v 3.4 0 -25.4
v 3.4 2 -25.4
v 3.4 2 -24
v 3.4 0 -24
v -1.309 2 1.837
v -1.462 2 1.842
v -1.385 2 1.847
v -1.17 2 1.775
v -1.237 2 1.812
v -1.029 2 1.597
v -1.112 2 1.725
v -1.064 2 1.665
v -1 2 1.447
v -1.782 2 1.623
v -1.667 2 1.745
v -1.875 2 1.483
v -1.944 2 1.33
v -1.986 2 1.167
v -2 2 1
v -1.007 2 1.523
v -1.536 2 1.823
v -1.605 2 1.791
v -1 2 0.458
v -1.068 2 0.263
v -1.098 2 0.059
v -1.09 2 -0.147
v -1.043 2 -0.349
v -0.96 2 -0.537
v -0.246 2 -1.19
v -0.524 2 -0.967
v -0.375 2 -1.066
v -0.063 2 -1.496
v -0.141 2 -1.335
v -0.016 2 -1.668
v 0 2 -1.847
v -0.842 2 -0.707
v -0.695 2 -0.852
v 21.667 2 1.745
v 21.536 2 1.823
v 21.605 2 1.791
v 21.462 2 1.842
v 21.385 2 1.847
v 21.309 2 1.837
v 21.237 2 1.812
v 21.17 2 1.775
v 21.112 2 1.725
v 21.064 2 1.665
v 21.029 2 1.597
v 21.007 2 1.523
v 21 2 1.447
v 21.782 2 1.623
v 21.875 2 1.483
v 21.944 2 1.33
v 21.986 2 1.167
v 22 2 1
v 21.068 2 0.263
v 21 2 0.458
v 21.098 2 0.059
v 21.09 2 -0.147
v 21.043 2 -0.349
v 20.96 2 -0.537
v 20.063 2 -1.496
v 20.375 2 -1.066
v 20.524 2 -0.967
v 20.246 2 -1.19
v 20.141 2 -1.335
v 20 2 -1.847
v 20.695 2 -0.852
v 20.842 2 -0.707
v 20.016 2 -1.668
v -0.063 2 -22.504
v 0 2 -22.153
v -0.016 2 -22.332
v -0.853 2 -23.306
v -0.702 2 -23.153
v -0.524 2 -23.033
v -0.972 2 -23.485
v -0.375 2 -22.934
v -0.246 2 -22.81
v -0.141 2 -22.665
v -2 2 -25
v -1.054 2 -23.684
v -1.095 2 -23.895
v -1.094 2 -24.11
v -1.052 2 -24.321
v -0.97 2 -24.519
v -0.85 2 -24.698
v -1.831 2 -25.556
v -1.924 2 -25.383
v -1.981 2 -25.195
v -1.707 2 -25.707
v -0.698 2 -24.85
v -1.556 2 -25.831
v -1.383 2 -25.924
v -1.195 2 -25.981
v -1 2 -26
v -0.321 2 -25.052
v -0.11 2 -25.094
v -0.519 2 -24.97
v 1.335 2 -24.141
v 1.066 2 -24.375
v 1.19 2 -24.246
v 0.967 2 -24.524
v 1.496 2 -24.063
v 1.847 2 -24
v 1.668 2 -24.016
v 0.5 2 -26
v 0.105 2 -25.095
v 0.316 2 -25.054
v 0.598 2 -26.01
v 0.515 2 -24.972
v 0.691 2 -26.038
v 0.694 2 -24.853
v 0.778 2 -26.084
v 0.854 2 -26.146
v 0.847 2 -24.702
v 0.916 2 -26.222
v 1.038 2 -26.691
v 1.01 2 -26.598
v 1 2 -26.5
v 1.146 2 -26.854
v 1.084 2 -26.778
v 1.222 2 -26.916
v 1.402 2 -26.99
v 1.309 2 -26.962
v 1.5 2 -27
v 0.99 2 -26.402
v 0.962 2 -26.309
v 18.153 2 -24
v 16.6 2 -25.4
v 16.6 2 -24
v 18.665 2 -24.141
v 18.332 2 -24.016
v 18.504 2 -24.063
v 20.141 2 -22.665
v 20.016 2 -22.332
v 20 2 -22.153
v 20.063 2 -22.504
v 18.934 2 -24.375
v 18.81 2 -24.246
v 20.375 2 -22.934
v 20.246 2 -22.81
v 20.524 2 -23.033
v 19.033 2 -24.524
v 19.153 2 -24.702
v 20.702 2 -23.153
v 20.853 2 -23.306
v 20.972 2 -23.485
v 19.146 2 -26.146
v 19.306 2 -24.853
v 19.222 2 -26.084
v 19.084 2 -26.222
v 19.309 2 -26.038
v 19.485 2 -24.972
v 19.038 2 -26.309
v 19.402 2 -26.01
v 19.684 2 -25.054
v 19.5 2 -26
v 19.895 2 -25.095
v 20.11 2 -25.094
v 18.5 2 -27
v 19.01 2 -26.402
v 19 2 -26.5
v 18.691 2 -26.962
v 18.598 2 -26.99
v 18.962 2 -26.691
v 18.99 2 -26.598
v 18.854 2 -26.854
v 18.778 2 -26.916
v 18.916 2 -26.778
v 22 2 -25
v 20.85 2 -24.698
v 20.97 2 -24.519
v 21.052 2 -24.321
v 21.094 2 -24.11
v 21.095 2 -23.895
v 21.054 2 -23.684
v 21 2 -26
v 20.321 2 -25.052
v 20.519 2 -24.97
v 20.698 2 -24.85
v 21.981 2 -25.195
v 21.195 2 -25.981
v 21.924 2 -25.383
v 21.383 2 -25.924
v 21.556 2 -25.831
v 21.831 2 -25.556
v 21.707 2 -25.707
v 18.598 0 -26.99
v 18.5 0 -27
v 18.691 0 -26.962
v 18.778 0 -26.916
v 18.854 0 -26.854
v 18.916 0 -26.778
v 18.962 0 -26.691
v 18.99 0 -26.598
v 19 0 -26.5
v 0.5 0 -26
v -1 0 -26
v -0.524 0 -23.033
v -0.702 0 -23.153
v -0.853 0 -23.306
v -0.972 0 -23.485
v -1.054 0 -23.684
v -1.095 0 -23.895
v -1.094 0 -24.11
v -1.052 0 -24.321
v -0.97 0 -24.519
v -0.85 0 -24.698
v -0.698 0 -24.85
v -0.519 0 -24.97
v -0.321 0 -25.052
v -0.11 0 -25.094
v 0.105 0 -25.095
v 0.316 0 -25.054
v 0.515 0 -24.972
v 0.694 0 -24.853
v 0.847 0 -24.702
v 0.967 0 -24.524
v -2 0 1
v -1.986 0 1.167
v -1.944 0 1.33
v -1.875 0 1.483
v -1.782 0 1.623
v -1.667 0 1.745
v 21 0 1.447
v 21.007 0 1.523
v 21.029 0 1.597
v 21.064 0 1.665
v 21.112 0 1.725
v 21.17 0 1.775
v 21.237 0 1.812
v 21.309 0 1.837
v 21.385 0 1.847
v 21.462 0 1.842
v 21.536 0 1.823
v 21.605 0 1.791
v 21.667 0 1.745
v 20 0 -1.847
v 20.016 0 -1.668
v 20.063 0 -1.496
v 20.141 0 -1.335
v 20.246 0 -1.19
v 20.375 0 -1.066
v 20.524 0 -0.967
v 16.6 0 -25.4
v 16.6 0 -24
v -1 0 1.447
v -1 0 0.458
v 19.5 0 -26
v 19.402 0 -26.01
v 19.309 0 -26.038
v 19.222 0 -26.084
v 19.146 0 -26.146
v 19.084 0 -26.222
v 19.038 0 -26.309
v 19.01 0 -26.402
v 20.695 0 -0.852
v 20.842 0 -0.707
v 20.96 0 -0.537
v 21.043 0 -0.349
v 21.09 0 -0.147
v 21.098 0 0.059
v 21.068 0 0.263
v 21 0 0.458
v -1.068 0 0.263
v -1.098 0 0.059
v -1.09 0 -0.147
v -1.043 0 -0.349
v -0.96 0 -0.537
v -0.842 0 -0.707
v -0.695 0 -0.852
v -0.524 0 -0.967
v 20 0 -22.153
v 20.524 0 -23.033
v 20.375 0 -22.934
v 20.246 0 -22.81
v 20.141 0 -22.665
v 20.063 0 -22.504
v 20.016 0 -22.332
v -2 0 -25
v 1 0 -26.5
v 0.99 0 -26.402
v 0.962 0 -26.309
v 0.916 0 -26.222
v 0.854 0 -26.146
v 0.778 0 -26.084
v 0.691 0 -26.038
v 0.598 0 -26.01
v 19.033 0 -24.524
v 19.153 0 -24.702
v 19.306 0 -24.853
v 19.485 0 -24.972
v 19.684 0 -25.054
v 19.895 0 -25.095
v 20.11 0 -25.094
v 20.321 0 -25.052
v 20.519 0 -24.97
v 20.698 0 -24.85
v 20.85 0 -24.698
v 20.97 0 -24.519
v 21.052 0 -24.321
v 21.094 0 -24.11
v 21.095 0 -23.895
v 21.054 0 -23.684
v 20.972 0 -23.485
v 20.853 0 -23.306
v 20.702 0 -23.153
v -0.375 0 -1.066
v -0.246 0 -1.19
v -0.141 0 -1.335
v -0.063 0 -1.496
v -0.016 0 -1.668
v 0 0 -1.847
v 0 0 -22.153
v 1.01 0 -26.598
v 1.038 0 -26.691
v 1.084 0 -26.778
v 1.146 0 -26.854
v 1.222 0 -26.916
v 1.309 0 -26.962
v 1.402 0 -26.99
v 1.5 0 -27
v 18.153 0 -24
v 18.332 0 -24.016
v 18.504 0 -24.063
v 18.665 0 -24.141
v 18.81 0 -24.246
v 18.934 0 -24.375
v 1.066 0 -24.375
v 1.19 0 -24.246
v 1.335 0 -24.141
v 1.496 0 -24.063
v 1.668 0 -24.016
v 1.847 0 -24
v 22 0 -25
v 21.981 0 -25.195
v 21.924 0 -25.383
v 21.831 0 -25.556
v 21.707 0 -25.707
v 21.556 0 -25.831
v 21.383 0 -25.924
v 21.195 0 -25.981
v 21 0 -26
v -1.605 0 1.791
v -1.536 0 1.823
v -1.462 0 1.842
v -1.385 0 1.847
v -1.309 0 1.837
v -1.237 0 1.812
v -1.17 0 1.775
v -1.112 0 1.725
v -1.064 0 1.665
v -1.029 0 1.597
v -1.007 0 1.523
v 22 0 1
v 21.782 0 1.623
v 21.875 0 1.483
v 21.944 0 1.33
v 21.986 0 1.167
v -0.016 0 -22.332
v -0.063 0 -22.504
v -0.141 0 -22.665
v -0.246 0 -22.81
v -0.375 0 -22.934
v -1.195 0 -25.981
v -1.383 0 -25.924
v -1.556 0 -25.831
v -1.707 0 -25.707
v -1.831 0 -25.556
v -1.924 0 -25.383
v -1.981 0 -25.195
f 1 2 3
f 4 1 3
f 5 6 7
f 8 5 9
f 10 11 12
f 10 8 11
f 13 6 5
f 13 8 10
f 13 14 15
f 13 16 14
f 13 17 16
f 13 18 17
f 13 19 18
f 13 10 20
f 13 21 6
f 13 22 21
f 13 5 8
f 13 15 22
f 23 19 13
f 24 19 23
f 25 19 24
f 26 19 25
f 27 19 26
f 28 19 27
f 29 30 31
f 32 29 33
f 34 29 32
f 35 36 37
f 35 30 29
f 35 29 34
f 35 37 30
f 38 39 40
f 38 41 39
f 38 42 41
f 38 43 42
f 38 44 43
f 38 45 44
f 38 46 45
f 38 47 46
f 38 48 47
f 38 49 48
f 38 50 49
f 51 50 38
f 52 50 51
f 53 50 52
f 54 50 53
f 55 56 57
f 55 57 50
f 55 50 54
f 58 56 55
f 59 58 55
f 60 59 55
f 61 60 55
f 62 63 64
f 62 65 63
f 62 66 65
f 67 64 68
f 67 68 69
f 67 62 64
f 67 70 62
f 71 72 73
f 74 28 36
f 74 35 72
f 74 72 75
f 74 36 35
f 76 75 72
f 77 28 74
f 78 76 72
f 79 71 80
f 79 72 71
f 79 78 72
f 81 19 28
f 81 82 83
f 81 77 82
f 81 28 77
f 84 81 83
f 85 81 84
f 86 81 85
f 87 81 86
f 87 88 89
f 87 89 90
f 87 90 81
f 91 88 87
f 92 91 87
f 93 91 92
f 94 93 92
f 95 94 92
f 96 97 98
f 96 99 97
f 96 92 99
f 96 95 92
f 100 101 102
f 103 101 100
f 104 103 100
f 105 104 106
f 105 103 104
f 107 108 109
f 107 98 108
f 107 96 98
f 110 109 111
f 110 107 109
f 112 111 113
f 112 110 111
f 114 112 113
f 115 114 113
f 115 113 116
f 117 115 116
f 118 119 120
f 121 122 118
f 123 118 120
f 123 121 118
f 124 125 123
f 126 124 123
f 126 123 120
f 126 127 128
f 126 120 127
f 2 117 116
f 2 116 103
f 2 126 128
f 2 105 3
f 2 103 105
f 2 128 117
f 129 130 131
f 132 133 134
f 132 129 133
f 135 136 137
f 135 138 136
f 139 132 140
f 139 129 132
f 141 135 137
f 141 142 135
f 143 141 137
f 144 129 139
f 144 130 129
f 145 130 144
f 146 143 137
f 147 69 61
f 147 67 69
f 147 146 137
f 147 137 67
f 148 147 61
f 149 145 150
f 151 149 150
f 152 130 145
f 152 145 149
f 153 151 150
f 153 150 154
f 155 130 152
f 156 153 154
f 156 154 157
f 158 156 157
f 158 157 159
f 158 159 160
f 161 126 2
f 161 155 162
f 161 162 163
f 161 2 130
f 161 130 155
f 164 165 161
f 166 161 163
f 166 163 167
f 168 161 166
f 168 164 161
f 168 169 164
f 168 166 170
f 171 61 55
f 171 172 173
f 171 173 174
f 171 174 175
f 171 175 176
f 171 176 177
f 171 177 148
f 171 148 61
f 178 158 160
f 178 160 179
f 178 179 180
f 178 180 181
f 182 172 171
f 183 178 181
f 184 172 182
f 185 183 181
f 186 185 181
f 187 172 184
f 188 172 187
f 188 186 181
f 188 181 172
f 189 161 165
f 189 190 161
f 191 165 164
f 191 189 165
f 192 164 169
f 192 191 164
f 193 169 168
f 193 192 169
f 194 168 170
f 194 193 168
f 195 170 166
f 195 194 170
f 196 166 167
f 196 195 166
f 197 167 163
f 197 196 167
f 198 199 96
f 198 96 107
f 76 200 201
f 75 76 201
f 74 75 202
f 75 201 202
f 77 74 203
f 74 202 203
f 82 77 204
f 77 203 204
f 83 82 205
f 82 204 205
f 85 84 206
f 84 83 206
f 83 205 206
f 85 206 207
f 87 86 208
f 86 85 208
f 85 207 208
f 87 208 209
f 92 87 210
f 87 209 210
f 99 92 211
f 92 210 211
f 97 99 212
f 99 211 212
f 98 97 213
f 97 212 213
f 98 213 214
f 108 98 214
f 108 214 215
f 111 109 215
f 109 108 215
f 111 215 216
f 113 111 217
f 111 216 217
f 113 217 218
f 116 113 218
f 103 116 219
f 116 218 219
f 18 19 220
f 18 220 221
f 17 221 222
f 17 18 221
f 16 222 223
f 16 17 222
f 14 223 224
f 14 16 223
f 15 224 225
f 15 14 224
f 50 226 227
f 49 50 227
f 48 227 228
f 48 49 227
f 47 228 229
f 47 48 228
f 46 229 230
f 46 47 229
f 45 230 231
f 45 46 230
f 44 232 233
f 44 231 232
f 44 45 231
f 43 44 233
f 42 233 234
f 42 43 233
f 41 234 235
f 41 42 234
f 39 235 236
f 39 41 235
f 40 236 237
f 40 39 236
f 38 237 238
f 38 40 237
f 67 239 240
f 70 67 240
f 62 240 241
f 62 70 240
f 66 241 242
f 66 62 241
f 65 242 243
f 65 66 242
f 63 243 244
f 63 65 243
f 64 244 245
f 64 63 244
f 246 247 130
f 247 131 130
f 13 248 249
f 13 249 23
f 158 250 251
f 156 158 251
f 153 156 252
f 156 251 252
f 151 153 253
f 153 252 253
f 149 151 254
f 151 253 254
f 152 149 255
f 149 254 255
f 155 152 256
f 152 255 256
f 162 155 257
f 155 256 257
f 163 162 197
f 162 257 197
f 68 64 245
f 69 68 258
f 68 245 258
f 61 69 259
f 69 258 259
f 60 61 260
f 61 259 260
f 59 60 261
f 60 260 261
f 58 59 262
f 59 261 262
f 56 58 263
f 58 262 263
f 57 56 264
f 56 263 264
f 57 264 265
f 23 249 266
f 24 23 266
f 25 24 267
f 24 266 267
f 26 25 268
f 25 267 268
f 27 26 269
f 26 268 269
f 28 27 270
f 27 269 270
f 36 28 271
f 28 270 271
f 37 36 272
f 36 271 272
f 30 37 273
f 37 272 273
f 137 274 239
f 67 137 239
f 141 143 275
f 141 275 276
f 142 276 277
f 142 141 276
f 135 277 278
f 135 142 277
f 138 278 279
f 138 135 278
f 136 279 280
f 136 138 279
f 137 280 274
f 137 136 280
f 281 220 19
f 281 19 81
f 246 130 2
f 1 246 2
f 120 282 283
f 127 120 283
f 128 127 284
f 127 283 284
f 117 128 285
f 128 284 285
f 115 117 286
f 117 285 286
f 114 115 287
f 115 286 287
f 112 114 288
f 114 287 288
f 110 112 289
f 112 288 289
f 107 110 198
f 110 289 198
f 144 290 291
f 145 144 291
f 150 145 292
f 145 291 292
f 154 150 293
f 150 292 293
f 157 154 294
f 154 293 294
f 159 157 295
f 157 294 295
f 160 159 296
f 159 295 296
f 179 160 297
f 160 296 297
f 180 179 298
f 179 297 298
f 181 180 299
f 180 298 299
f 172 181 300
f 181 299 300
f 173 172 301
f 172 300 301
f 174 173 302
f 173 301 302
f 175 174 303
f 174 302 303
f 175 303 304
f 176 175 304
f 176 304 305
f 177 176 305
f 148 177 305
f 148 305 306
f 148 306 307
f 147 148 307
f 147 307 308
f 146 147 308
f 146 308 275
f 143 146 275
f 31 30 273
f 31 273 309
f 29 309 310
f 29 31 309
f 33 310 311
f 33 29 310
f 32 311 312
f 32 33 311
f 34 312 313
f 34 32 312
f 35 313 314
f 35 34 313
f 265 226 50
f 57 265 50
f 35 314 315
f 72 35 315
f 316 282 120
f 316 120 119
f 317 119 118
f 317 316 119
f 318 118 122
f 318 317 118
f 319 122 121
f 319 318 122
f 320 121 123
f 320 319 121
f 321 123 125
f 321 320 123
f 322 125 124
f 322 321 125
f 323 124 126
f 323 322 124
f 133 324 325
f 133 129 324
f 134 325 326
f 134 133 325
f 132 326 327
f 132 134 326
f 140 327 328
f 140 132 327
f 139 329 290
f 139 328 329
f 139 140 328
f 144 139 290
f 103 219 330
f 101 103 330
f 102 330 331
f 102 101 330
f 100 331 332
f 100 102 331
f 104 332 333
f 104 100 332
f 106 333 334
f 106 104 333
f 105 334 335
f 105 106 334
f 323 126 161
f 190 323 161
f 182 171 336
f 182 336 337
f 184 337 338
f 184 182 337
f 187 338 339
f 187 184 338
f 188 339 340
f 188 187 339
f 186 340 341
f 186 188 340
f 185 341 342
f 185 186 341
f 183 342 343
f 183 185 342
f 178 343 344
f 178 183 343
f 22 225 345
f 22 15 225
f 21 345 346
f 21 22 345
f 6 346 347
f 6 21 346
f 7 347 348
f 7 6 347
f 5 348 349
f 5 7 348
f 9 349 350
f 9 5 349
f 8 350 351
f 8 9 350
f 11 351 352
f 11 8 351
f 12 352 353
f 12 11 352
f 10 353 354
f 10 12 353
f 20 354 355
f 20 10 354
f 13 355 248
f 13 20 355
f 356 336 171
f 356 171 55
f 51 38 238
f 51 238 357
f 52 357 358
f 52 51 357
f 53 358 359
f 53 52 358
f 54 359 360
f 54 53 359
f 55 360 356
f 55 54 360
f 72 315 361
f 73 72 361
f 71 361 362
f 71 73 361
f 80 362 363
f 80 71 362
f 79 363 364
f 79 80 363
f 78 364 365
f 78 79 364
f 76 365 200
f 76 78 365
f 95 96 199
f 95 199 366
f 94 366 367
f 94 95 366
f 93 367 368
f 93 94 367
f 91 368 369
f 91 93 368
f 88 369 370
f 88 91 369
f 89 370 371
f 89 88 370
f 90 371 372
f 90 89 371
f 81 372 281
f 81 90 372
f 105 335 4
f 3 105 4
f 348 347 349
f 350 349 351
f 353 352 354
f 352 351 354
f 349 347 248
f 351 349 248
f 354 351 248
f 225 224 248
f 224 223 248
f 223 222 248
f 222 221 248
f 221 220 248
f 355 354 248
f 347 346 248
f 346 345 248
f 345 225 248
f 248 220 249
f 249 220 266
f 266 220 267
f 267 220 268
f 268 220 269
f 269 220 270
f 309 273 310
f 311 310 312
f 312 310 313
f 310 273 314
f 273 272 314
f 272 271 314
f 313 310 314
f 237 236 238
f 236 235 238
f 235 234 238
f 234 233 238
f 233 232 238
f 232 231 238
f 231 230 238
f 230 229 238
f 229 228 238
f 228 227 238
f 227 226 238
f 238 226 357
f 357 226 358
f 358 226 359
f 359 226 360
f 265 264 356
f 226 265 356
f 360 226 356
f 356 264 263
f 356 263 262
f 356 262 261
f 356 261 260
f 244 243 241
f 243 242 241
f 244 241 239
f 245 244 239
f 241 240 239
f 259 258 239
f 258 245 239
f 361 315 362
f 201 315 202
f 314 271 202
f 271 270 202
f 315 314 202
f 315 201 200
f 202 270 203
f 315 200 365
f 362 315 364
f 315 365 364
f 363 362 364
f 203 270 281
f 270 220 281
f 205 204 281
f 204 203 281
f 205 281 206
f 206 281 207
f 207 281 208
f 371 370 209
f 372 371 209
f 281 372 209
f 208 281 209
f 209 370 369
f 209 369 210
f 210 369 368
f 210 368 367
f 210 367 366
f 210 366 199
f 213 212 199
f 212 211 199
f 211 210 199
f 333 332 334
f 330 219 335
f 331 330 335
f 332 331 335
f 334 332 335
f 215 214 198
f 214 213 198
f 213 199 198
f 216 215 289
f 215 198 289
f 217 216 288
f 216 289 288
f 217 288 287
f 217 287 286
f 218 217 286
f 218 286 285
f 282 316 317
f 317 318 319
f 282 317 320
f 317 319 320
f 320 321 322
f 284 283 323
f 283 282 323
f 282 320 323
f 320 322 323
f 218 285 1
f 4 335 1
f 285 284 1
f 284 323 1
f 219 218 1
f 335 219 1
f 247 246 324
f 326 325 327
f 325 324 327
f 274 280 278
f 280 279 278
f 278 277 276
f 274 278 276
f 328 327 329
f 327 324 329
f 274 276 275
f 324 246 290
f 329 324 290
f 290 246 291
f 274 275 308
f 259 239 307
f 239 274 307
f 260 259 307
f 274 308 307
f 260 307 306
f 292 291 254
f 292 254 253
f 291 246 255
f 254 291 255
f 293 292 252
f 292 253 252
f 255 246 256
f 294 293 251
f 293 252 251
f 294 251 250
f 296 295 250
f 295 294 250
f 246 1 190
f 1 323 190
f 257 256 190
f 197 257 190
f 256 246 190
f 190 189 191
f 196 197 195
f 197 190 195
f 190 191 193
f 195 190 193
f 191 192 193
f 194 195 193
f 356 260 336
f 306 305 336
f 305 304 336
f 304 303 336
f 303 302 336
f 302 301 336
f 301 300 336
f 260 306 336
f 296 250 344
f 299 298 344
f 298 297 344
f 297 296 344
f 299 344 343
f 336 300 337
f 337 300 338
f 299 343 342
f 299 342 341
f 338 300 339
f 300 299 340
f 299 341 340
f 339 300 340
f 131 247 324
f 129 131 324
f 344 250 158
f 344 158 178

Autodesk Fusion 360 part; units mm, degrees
sketch "Sketch1" plane through (0, 0, 0) normal (0, 1, 0) x (1, 0, 0)
  line L0 (0, 0) -> (20, 0) construction
  line L1 (20, 0) -> (20, 24) construction
  line L2 (20, 24) -> (0, 24) construction
  line L3 (0, 24) -> (0, 0) construction
  circle A0 centre (0, 24) radius 1.1
  circle A1 centre (20, 24) radius 1.1
  circle A2 centre (20, 0) radius 1.1
  circle A3 centre (0, 0) radius 1.1
  line L4 (-2, 26) -> (22, 26)
  line L5 (22, 26) -> (22, -2)
  line L6 (22, -2) -> (-2, -2)
  line L7 (-2, -2) -> (-2, 26)
  line L8 (0, 24) -> (20, 24)
  line L9 (20, 24) -> (20, 0)
  line L10 (20, 0) -> (0, 0)
  line L11 (0, 0) -> (0, 24)
  dimension "d1" = 24
  dimension "d2" = 20
  dimension "d3" = 2.2
  dimension "d4" = 2
  dimension "d5" = 2
  dimension "d6" = 2
  dimension "d7" = 2
extrude "Extrude1" add sketch "Sketch1" along normal blind 2
fillet "Fillet1" radius 1 8 edges at (1.1, 1, -24) (0, 1, -22.9) (0, 1, -1.1) (18.9, 1, -24) (1.1, 1, 0) (20, 1, -22.9) (20, 1, -1.1) (18.9, 1, 0)
fillet "Fillet2" radius 1 4 edges at (-2, 1, -26) (-2, 1, 2) (22, 1, 2) (22, 1, -26)
extrude "Extrude2" cut 1 faces at (13.6667, 0.6667, 2) along direction (0, 0, -1) up to surface (2 mm away)
fillet "Fillet3" radius 0.4 2 edges at (-1, 1, 2) (21, 1, 2)
sketch "Sketch2" plane through (0, 2, 0) normal (0, 1, 0) x (-1, 0, 0)
  arc A0 (-21, 1.4472) -> (-21.6667, 1.7454) centre (-21.4, 1.4472) ccw
  arc A1 (-21.6667, 1.7454) -> (-22, 1) centre (-21, 1) ccw
  line L0 (-22, 1) -> (-22, -25)
  arc A2 (-22, -25) -> (-21, -26) centre (-21, -25) ccw
  line L1 (-21, -26) -> (1, -26)
  arc A3 (1, -26) -> (2, -25) centre (1, -25) ccw
  line L2 (2, -25) -> (2, 1)
  arc A4 (2, 1) -> (1.6667, 1.7454) centre (1, 1) ccw
  arc A5 (1.6667, 1.7454) -> (1, 1.4472) centre (1.4, 1.4472) ccw
  line L3 (1, 1.4472) -> (1, 0.4583)
  arc A6 (0.5238, -0.9673) -> (1, 0.4583) centre (0, 0) ccw
  arc A7 (0.5238, -0.9673) -> (0, -1.8466) centre (1, -1.8466) ccw
  line L4 (0, -1.8466) -> (0, -22.1534)
  arc A8 (0, -22.1534) -> (0.5238, -23.0327) centre (1, -22.1534) ccw
  arc A9 (-0.9673, -24.5238) -> (0.5238, -23.0327) centre (0, -24) ccw
  arc A10 (-0.9673, -24.5238) -> (-1.8466, -24) centre (-1.8466, -25) ccw
  line L5 (-1.8466, -24) -> (-18.1534, -24)
  arc A11 (-18.1534, -24) -> (-19.0327, -24.5238) centre (-18.1534, -25) ccw
  arc A12 (-20.5238, -23.0327) -> (-19.0327, -24.5238) centre (-20, -24) ccw
  arc A13 (-20.5238, -23.0327) -> (-20, -22.1534) centre (-21, -22.1534) ccw
  line L6 (-20, -22.1534) -> (-20, -1.8466)
  arc A14 (-20, -1.8466) -> (-20.5238, -0.9673) centre (-21, -1.8466) ccw
  arc A15 (-21, 0.4583) -> (-20.5238, -0.9673) centre (-20, 0) ccw
  line L7 (-21, 0.4583) -> (-21, 1.4472)
  line L8 (-3.4, -24) -> (-16.6, -24)
  line L9 (-16.6, -24) -> (-16.6, -25.4)
  line L10 (-16.6, -25.4) -> (-3.4, -25.4)
  line L11 (-3.4, -25.4) -> (-3.4, -24)
  line L12 (-1, -26) -> (-1, -27)
  line L13 (-1, -27) -> (-19, -27)
  line L14 (-19, -27) -> (-19, -26)
  line L15 (-1, -26) -> (-19, -26)
  dimension "d18" = 1.4
  dimension "d19" = 13.2
  dimension "d20" = 1
  dimension "d21" = 18
extrude "Extrude3" cut sketch "Sketch2" against normal up to surface (2 mm away) contours L5 L8 L9 L10 L11
extrude "Extrude4" add sketch "Sketch2" against normal up to surface (2 mm away) contours L1 L12 L13 L14 L15
fillet "Fillet5" radius 0.5 4 edges at (1, 1, -26) (1, 1, -27) (19, 1, -27) (19, 1, -26)
